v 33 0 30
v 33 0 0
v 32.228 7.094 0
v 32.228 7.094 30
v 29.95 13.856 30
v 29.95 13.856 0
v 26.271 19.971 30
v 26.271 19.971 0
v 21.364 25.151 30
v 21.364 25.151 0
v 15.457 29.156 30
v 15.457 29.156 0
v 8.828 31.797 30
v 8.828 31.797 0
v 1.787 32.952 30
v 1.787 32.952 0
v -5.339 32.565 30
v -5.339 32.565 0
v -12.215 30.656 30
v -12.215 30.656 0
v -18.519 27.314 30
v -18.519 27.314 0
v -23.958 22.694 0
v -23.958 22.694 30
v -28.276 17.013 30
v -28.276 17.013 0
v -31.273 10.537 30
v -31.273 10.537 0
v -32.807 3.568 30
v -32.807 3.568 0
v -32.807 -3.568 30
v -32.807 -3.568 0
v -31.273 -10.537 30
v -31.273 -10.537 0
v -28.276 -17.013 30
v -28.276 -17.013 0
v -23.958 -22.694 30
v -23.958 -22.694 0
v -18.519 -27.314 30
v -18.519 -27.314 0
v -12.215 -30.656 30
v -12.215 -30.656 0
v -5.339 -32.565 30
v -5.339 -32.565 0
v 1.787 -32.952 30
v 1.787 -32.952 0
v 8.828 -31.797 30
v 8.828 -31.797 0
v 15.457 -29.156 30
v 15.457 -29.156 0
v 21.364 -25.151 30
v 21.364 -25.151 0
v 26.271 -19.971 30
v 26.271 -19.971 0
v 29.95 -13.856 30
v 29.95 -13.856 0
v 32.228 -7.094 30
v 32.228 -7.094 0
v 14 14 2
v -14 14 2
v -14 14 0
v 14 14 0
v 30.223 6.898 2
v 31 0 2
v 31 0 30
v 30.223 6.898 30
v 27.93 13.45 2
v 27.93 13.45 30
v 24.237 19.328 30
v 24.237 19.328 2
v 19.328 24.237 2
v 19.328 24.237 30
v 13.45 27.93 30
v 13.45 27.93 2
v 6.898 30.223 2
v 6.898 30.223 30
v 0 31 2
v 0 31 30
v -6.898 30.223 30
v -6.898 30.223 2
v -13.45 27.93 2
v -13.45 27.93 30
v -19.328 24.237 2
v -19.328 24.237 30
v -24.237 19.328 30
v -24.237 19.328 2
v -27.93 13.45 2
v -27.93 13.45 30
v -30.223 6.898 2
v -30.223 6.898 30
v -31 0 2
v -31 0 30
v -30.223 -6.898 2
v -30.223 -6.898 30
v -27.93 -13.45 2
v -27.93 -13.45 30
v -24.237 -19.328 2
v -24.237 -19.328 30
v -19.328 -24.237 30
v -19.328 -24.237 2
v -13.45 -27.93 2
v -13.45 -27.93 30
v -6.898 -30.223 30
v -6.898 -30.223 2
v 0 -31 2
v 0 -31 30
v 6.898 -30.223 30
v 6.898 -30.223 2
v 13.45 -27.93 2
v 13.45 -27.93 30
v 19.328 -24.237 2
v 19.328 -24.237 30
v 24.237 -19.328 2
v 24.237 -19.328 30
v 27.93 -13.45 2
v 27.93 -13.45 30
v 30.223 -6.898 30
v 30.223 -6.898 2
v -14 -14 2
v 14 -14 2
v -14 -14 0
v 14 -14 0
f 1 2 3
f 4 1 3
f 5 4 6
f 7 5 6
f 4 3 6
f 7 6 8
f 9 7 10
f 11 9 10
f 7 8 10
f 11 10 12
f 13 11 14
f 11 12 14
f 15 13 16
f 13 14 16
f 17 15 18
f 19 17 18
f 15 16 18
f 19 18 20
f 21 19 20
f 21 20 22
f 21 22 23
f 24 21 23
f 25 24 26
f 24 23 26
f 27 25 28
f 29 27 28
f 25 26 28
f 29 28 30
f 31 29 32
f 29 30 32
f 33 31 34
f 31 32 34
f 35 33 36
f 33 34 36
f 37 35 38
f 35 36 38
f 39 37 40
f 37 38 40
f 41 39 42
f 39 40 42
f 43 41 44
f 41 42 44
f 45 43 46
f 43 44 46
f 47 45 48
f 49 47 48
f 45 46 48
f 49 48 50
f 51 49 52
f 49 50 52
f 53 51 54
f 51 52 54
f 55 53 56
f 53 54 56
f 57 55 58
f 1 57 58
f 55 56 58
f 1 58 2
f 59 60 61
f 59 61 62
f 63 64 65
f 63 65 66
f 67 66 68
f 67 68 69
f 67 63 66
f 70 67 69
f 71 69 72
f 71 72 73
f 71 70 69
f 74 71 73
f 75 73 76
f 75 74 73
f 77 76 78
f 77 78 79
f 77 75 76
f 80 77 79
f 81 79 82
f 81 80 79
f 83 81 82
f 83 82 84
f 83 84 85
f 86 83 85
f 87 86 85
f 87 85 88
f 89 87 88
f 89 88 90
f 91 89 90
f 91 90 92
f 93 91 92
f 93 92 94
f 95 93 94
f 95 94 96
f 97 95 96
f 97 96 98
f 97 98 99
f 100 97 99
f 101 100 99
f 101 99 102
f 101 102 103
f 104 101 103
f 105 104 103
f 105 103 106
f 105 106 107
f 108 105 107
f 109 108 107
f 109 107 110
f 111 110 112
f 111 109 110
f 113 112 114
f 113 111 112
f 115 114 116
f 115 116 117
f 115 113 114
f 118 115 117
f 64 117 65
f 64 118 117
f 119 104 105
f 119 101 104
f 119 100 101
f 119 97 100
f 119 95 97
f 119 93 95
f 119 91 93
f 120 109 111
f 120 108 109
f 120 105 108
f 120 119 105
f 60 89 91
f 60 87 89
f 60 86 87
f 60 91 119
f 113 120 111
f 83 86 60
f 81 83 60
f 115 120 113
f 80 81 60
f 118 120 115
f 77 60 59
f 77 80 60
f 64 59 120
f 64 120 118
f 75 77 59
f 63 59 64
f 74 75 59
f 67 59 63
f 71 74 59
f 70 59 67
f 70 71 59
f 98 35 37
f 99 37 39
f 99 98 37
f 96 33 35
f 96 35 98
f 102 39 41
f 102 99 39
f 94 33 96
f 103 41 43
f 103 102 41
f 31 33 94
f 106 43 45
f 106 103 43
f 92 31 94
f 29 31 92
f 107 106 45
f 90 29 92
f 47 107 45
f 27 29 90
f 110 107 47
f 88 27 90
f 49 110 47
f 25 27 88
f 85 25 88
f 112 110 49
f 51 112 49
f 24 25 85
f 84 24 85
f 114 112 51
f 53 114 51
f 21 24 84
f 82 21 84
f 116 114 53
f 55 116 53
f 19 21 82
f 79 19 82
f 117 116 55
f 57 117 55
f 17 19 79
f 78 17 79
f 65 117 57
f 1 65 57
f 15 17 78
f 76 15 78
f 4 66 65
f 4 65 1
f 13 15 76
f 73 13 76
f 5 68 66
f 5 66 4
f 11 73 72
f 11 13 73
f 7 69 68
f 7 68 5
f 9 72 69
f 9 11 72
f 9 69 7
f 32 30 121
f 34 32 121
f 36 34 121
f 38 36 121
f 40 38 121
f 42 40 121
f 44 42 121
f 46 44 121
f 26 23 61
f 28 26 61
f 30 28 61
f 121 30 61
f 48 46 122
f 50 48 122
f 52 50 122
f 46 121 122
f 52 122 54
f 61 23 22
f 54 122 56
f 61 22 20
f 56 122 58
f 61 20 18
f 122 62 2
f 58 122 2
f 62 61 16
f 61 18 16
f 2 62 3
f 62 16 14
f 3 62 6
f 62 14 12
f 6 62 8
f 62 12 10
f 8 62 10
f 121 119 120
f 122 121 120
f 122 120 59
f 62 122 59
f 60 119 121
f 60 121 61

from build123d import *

# Parameters (mm, degrees)
F0_R     = 33
F1_DEPTH = 30
F2_T     = -2
F3_DEPTH = 109
F4_W     = 28
F4_H     = 28
F5_DEPTH = 12.5


# Not quite as in the source:
# - an extrude ends at something that could not be found from the text; its depth is read off the source's solid


with BuildPart() as f1:
    # F0 (on Top) → F1 (new body)
    with BuildSketch(Plane.XY):
        Circle(F0_R)
    extrude(amount=F1_DEPTH)

    # F2
    f2_openings = [f1.faces().sort_by_distance(p)[0] for p in [
        (0, 0, 30),
    ]]
    offset(amount=F2_T, openings=f2_openings)

    # F0 (on Top) → F3 (cut, through all)
    with BuildSketch(Plane.XY):
        Circle(F0_R)
    extrude(amount=-F3_DEPTH, mode=Mode.SUBTRACT)

    # F4 (on face) → F5 (cut, symmetric)
    with BuildSketch(Plane.XY):
        Rectangle(F4_W, F4_H)
    extrude(amount=F5_DEPTH, both=True, mode=Mode.SUBTRACT)


solid = f1.part
